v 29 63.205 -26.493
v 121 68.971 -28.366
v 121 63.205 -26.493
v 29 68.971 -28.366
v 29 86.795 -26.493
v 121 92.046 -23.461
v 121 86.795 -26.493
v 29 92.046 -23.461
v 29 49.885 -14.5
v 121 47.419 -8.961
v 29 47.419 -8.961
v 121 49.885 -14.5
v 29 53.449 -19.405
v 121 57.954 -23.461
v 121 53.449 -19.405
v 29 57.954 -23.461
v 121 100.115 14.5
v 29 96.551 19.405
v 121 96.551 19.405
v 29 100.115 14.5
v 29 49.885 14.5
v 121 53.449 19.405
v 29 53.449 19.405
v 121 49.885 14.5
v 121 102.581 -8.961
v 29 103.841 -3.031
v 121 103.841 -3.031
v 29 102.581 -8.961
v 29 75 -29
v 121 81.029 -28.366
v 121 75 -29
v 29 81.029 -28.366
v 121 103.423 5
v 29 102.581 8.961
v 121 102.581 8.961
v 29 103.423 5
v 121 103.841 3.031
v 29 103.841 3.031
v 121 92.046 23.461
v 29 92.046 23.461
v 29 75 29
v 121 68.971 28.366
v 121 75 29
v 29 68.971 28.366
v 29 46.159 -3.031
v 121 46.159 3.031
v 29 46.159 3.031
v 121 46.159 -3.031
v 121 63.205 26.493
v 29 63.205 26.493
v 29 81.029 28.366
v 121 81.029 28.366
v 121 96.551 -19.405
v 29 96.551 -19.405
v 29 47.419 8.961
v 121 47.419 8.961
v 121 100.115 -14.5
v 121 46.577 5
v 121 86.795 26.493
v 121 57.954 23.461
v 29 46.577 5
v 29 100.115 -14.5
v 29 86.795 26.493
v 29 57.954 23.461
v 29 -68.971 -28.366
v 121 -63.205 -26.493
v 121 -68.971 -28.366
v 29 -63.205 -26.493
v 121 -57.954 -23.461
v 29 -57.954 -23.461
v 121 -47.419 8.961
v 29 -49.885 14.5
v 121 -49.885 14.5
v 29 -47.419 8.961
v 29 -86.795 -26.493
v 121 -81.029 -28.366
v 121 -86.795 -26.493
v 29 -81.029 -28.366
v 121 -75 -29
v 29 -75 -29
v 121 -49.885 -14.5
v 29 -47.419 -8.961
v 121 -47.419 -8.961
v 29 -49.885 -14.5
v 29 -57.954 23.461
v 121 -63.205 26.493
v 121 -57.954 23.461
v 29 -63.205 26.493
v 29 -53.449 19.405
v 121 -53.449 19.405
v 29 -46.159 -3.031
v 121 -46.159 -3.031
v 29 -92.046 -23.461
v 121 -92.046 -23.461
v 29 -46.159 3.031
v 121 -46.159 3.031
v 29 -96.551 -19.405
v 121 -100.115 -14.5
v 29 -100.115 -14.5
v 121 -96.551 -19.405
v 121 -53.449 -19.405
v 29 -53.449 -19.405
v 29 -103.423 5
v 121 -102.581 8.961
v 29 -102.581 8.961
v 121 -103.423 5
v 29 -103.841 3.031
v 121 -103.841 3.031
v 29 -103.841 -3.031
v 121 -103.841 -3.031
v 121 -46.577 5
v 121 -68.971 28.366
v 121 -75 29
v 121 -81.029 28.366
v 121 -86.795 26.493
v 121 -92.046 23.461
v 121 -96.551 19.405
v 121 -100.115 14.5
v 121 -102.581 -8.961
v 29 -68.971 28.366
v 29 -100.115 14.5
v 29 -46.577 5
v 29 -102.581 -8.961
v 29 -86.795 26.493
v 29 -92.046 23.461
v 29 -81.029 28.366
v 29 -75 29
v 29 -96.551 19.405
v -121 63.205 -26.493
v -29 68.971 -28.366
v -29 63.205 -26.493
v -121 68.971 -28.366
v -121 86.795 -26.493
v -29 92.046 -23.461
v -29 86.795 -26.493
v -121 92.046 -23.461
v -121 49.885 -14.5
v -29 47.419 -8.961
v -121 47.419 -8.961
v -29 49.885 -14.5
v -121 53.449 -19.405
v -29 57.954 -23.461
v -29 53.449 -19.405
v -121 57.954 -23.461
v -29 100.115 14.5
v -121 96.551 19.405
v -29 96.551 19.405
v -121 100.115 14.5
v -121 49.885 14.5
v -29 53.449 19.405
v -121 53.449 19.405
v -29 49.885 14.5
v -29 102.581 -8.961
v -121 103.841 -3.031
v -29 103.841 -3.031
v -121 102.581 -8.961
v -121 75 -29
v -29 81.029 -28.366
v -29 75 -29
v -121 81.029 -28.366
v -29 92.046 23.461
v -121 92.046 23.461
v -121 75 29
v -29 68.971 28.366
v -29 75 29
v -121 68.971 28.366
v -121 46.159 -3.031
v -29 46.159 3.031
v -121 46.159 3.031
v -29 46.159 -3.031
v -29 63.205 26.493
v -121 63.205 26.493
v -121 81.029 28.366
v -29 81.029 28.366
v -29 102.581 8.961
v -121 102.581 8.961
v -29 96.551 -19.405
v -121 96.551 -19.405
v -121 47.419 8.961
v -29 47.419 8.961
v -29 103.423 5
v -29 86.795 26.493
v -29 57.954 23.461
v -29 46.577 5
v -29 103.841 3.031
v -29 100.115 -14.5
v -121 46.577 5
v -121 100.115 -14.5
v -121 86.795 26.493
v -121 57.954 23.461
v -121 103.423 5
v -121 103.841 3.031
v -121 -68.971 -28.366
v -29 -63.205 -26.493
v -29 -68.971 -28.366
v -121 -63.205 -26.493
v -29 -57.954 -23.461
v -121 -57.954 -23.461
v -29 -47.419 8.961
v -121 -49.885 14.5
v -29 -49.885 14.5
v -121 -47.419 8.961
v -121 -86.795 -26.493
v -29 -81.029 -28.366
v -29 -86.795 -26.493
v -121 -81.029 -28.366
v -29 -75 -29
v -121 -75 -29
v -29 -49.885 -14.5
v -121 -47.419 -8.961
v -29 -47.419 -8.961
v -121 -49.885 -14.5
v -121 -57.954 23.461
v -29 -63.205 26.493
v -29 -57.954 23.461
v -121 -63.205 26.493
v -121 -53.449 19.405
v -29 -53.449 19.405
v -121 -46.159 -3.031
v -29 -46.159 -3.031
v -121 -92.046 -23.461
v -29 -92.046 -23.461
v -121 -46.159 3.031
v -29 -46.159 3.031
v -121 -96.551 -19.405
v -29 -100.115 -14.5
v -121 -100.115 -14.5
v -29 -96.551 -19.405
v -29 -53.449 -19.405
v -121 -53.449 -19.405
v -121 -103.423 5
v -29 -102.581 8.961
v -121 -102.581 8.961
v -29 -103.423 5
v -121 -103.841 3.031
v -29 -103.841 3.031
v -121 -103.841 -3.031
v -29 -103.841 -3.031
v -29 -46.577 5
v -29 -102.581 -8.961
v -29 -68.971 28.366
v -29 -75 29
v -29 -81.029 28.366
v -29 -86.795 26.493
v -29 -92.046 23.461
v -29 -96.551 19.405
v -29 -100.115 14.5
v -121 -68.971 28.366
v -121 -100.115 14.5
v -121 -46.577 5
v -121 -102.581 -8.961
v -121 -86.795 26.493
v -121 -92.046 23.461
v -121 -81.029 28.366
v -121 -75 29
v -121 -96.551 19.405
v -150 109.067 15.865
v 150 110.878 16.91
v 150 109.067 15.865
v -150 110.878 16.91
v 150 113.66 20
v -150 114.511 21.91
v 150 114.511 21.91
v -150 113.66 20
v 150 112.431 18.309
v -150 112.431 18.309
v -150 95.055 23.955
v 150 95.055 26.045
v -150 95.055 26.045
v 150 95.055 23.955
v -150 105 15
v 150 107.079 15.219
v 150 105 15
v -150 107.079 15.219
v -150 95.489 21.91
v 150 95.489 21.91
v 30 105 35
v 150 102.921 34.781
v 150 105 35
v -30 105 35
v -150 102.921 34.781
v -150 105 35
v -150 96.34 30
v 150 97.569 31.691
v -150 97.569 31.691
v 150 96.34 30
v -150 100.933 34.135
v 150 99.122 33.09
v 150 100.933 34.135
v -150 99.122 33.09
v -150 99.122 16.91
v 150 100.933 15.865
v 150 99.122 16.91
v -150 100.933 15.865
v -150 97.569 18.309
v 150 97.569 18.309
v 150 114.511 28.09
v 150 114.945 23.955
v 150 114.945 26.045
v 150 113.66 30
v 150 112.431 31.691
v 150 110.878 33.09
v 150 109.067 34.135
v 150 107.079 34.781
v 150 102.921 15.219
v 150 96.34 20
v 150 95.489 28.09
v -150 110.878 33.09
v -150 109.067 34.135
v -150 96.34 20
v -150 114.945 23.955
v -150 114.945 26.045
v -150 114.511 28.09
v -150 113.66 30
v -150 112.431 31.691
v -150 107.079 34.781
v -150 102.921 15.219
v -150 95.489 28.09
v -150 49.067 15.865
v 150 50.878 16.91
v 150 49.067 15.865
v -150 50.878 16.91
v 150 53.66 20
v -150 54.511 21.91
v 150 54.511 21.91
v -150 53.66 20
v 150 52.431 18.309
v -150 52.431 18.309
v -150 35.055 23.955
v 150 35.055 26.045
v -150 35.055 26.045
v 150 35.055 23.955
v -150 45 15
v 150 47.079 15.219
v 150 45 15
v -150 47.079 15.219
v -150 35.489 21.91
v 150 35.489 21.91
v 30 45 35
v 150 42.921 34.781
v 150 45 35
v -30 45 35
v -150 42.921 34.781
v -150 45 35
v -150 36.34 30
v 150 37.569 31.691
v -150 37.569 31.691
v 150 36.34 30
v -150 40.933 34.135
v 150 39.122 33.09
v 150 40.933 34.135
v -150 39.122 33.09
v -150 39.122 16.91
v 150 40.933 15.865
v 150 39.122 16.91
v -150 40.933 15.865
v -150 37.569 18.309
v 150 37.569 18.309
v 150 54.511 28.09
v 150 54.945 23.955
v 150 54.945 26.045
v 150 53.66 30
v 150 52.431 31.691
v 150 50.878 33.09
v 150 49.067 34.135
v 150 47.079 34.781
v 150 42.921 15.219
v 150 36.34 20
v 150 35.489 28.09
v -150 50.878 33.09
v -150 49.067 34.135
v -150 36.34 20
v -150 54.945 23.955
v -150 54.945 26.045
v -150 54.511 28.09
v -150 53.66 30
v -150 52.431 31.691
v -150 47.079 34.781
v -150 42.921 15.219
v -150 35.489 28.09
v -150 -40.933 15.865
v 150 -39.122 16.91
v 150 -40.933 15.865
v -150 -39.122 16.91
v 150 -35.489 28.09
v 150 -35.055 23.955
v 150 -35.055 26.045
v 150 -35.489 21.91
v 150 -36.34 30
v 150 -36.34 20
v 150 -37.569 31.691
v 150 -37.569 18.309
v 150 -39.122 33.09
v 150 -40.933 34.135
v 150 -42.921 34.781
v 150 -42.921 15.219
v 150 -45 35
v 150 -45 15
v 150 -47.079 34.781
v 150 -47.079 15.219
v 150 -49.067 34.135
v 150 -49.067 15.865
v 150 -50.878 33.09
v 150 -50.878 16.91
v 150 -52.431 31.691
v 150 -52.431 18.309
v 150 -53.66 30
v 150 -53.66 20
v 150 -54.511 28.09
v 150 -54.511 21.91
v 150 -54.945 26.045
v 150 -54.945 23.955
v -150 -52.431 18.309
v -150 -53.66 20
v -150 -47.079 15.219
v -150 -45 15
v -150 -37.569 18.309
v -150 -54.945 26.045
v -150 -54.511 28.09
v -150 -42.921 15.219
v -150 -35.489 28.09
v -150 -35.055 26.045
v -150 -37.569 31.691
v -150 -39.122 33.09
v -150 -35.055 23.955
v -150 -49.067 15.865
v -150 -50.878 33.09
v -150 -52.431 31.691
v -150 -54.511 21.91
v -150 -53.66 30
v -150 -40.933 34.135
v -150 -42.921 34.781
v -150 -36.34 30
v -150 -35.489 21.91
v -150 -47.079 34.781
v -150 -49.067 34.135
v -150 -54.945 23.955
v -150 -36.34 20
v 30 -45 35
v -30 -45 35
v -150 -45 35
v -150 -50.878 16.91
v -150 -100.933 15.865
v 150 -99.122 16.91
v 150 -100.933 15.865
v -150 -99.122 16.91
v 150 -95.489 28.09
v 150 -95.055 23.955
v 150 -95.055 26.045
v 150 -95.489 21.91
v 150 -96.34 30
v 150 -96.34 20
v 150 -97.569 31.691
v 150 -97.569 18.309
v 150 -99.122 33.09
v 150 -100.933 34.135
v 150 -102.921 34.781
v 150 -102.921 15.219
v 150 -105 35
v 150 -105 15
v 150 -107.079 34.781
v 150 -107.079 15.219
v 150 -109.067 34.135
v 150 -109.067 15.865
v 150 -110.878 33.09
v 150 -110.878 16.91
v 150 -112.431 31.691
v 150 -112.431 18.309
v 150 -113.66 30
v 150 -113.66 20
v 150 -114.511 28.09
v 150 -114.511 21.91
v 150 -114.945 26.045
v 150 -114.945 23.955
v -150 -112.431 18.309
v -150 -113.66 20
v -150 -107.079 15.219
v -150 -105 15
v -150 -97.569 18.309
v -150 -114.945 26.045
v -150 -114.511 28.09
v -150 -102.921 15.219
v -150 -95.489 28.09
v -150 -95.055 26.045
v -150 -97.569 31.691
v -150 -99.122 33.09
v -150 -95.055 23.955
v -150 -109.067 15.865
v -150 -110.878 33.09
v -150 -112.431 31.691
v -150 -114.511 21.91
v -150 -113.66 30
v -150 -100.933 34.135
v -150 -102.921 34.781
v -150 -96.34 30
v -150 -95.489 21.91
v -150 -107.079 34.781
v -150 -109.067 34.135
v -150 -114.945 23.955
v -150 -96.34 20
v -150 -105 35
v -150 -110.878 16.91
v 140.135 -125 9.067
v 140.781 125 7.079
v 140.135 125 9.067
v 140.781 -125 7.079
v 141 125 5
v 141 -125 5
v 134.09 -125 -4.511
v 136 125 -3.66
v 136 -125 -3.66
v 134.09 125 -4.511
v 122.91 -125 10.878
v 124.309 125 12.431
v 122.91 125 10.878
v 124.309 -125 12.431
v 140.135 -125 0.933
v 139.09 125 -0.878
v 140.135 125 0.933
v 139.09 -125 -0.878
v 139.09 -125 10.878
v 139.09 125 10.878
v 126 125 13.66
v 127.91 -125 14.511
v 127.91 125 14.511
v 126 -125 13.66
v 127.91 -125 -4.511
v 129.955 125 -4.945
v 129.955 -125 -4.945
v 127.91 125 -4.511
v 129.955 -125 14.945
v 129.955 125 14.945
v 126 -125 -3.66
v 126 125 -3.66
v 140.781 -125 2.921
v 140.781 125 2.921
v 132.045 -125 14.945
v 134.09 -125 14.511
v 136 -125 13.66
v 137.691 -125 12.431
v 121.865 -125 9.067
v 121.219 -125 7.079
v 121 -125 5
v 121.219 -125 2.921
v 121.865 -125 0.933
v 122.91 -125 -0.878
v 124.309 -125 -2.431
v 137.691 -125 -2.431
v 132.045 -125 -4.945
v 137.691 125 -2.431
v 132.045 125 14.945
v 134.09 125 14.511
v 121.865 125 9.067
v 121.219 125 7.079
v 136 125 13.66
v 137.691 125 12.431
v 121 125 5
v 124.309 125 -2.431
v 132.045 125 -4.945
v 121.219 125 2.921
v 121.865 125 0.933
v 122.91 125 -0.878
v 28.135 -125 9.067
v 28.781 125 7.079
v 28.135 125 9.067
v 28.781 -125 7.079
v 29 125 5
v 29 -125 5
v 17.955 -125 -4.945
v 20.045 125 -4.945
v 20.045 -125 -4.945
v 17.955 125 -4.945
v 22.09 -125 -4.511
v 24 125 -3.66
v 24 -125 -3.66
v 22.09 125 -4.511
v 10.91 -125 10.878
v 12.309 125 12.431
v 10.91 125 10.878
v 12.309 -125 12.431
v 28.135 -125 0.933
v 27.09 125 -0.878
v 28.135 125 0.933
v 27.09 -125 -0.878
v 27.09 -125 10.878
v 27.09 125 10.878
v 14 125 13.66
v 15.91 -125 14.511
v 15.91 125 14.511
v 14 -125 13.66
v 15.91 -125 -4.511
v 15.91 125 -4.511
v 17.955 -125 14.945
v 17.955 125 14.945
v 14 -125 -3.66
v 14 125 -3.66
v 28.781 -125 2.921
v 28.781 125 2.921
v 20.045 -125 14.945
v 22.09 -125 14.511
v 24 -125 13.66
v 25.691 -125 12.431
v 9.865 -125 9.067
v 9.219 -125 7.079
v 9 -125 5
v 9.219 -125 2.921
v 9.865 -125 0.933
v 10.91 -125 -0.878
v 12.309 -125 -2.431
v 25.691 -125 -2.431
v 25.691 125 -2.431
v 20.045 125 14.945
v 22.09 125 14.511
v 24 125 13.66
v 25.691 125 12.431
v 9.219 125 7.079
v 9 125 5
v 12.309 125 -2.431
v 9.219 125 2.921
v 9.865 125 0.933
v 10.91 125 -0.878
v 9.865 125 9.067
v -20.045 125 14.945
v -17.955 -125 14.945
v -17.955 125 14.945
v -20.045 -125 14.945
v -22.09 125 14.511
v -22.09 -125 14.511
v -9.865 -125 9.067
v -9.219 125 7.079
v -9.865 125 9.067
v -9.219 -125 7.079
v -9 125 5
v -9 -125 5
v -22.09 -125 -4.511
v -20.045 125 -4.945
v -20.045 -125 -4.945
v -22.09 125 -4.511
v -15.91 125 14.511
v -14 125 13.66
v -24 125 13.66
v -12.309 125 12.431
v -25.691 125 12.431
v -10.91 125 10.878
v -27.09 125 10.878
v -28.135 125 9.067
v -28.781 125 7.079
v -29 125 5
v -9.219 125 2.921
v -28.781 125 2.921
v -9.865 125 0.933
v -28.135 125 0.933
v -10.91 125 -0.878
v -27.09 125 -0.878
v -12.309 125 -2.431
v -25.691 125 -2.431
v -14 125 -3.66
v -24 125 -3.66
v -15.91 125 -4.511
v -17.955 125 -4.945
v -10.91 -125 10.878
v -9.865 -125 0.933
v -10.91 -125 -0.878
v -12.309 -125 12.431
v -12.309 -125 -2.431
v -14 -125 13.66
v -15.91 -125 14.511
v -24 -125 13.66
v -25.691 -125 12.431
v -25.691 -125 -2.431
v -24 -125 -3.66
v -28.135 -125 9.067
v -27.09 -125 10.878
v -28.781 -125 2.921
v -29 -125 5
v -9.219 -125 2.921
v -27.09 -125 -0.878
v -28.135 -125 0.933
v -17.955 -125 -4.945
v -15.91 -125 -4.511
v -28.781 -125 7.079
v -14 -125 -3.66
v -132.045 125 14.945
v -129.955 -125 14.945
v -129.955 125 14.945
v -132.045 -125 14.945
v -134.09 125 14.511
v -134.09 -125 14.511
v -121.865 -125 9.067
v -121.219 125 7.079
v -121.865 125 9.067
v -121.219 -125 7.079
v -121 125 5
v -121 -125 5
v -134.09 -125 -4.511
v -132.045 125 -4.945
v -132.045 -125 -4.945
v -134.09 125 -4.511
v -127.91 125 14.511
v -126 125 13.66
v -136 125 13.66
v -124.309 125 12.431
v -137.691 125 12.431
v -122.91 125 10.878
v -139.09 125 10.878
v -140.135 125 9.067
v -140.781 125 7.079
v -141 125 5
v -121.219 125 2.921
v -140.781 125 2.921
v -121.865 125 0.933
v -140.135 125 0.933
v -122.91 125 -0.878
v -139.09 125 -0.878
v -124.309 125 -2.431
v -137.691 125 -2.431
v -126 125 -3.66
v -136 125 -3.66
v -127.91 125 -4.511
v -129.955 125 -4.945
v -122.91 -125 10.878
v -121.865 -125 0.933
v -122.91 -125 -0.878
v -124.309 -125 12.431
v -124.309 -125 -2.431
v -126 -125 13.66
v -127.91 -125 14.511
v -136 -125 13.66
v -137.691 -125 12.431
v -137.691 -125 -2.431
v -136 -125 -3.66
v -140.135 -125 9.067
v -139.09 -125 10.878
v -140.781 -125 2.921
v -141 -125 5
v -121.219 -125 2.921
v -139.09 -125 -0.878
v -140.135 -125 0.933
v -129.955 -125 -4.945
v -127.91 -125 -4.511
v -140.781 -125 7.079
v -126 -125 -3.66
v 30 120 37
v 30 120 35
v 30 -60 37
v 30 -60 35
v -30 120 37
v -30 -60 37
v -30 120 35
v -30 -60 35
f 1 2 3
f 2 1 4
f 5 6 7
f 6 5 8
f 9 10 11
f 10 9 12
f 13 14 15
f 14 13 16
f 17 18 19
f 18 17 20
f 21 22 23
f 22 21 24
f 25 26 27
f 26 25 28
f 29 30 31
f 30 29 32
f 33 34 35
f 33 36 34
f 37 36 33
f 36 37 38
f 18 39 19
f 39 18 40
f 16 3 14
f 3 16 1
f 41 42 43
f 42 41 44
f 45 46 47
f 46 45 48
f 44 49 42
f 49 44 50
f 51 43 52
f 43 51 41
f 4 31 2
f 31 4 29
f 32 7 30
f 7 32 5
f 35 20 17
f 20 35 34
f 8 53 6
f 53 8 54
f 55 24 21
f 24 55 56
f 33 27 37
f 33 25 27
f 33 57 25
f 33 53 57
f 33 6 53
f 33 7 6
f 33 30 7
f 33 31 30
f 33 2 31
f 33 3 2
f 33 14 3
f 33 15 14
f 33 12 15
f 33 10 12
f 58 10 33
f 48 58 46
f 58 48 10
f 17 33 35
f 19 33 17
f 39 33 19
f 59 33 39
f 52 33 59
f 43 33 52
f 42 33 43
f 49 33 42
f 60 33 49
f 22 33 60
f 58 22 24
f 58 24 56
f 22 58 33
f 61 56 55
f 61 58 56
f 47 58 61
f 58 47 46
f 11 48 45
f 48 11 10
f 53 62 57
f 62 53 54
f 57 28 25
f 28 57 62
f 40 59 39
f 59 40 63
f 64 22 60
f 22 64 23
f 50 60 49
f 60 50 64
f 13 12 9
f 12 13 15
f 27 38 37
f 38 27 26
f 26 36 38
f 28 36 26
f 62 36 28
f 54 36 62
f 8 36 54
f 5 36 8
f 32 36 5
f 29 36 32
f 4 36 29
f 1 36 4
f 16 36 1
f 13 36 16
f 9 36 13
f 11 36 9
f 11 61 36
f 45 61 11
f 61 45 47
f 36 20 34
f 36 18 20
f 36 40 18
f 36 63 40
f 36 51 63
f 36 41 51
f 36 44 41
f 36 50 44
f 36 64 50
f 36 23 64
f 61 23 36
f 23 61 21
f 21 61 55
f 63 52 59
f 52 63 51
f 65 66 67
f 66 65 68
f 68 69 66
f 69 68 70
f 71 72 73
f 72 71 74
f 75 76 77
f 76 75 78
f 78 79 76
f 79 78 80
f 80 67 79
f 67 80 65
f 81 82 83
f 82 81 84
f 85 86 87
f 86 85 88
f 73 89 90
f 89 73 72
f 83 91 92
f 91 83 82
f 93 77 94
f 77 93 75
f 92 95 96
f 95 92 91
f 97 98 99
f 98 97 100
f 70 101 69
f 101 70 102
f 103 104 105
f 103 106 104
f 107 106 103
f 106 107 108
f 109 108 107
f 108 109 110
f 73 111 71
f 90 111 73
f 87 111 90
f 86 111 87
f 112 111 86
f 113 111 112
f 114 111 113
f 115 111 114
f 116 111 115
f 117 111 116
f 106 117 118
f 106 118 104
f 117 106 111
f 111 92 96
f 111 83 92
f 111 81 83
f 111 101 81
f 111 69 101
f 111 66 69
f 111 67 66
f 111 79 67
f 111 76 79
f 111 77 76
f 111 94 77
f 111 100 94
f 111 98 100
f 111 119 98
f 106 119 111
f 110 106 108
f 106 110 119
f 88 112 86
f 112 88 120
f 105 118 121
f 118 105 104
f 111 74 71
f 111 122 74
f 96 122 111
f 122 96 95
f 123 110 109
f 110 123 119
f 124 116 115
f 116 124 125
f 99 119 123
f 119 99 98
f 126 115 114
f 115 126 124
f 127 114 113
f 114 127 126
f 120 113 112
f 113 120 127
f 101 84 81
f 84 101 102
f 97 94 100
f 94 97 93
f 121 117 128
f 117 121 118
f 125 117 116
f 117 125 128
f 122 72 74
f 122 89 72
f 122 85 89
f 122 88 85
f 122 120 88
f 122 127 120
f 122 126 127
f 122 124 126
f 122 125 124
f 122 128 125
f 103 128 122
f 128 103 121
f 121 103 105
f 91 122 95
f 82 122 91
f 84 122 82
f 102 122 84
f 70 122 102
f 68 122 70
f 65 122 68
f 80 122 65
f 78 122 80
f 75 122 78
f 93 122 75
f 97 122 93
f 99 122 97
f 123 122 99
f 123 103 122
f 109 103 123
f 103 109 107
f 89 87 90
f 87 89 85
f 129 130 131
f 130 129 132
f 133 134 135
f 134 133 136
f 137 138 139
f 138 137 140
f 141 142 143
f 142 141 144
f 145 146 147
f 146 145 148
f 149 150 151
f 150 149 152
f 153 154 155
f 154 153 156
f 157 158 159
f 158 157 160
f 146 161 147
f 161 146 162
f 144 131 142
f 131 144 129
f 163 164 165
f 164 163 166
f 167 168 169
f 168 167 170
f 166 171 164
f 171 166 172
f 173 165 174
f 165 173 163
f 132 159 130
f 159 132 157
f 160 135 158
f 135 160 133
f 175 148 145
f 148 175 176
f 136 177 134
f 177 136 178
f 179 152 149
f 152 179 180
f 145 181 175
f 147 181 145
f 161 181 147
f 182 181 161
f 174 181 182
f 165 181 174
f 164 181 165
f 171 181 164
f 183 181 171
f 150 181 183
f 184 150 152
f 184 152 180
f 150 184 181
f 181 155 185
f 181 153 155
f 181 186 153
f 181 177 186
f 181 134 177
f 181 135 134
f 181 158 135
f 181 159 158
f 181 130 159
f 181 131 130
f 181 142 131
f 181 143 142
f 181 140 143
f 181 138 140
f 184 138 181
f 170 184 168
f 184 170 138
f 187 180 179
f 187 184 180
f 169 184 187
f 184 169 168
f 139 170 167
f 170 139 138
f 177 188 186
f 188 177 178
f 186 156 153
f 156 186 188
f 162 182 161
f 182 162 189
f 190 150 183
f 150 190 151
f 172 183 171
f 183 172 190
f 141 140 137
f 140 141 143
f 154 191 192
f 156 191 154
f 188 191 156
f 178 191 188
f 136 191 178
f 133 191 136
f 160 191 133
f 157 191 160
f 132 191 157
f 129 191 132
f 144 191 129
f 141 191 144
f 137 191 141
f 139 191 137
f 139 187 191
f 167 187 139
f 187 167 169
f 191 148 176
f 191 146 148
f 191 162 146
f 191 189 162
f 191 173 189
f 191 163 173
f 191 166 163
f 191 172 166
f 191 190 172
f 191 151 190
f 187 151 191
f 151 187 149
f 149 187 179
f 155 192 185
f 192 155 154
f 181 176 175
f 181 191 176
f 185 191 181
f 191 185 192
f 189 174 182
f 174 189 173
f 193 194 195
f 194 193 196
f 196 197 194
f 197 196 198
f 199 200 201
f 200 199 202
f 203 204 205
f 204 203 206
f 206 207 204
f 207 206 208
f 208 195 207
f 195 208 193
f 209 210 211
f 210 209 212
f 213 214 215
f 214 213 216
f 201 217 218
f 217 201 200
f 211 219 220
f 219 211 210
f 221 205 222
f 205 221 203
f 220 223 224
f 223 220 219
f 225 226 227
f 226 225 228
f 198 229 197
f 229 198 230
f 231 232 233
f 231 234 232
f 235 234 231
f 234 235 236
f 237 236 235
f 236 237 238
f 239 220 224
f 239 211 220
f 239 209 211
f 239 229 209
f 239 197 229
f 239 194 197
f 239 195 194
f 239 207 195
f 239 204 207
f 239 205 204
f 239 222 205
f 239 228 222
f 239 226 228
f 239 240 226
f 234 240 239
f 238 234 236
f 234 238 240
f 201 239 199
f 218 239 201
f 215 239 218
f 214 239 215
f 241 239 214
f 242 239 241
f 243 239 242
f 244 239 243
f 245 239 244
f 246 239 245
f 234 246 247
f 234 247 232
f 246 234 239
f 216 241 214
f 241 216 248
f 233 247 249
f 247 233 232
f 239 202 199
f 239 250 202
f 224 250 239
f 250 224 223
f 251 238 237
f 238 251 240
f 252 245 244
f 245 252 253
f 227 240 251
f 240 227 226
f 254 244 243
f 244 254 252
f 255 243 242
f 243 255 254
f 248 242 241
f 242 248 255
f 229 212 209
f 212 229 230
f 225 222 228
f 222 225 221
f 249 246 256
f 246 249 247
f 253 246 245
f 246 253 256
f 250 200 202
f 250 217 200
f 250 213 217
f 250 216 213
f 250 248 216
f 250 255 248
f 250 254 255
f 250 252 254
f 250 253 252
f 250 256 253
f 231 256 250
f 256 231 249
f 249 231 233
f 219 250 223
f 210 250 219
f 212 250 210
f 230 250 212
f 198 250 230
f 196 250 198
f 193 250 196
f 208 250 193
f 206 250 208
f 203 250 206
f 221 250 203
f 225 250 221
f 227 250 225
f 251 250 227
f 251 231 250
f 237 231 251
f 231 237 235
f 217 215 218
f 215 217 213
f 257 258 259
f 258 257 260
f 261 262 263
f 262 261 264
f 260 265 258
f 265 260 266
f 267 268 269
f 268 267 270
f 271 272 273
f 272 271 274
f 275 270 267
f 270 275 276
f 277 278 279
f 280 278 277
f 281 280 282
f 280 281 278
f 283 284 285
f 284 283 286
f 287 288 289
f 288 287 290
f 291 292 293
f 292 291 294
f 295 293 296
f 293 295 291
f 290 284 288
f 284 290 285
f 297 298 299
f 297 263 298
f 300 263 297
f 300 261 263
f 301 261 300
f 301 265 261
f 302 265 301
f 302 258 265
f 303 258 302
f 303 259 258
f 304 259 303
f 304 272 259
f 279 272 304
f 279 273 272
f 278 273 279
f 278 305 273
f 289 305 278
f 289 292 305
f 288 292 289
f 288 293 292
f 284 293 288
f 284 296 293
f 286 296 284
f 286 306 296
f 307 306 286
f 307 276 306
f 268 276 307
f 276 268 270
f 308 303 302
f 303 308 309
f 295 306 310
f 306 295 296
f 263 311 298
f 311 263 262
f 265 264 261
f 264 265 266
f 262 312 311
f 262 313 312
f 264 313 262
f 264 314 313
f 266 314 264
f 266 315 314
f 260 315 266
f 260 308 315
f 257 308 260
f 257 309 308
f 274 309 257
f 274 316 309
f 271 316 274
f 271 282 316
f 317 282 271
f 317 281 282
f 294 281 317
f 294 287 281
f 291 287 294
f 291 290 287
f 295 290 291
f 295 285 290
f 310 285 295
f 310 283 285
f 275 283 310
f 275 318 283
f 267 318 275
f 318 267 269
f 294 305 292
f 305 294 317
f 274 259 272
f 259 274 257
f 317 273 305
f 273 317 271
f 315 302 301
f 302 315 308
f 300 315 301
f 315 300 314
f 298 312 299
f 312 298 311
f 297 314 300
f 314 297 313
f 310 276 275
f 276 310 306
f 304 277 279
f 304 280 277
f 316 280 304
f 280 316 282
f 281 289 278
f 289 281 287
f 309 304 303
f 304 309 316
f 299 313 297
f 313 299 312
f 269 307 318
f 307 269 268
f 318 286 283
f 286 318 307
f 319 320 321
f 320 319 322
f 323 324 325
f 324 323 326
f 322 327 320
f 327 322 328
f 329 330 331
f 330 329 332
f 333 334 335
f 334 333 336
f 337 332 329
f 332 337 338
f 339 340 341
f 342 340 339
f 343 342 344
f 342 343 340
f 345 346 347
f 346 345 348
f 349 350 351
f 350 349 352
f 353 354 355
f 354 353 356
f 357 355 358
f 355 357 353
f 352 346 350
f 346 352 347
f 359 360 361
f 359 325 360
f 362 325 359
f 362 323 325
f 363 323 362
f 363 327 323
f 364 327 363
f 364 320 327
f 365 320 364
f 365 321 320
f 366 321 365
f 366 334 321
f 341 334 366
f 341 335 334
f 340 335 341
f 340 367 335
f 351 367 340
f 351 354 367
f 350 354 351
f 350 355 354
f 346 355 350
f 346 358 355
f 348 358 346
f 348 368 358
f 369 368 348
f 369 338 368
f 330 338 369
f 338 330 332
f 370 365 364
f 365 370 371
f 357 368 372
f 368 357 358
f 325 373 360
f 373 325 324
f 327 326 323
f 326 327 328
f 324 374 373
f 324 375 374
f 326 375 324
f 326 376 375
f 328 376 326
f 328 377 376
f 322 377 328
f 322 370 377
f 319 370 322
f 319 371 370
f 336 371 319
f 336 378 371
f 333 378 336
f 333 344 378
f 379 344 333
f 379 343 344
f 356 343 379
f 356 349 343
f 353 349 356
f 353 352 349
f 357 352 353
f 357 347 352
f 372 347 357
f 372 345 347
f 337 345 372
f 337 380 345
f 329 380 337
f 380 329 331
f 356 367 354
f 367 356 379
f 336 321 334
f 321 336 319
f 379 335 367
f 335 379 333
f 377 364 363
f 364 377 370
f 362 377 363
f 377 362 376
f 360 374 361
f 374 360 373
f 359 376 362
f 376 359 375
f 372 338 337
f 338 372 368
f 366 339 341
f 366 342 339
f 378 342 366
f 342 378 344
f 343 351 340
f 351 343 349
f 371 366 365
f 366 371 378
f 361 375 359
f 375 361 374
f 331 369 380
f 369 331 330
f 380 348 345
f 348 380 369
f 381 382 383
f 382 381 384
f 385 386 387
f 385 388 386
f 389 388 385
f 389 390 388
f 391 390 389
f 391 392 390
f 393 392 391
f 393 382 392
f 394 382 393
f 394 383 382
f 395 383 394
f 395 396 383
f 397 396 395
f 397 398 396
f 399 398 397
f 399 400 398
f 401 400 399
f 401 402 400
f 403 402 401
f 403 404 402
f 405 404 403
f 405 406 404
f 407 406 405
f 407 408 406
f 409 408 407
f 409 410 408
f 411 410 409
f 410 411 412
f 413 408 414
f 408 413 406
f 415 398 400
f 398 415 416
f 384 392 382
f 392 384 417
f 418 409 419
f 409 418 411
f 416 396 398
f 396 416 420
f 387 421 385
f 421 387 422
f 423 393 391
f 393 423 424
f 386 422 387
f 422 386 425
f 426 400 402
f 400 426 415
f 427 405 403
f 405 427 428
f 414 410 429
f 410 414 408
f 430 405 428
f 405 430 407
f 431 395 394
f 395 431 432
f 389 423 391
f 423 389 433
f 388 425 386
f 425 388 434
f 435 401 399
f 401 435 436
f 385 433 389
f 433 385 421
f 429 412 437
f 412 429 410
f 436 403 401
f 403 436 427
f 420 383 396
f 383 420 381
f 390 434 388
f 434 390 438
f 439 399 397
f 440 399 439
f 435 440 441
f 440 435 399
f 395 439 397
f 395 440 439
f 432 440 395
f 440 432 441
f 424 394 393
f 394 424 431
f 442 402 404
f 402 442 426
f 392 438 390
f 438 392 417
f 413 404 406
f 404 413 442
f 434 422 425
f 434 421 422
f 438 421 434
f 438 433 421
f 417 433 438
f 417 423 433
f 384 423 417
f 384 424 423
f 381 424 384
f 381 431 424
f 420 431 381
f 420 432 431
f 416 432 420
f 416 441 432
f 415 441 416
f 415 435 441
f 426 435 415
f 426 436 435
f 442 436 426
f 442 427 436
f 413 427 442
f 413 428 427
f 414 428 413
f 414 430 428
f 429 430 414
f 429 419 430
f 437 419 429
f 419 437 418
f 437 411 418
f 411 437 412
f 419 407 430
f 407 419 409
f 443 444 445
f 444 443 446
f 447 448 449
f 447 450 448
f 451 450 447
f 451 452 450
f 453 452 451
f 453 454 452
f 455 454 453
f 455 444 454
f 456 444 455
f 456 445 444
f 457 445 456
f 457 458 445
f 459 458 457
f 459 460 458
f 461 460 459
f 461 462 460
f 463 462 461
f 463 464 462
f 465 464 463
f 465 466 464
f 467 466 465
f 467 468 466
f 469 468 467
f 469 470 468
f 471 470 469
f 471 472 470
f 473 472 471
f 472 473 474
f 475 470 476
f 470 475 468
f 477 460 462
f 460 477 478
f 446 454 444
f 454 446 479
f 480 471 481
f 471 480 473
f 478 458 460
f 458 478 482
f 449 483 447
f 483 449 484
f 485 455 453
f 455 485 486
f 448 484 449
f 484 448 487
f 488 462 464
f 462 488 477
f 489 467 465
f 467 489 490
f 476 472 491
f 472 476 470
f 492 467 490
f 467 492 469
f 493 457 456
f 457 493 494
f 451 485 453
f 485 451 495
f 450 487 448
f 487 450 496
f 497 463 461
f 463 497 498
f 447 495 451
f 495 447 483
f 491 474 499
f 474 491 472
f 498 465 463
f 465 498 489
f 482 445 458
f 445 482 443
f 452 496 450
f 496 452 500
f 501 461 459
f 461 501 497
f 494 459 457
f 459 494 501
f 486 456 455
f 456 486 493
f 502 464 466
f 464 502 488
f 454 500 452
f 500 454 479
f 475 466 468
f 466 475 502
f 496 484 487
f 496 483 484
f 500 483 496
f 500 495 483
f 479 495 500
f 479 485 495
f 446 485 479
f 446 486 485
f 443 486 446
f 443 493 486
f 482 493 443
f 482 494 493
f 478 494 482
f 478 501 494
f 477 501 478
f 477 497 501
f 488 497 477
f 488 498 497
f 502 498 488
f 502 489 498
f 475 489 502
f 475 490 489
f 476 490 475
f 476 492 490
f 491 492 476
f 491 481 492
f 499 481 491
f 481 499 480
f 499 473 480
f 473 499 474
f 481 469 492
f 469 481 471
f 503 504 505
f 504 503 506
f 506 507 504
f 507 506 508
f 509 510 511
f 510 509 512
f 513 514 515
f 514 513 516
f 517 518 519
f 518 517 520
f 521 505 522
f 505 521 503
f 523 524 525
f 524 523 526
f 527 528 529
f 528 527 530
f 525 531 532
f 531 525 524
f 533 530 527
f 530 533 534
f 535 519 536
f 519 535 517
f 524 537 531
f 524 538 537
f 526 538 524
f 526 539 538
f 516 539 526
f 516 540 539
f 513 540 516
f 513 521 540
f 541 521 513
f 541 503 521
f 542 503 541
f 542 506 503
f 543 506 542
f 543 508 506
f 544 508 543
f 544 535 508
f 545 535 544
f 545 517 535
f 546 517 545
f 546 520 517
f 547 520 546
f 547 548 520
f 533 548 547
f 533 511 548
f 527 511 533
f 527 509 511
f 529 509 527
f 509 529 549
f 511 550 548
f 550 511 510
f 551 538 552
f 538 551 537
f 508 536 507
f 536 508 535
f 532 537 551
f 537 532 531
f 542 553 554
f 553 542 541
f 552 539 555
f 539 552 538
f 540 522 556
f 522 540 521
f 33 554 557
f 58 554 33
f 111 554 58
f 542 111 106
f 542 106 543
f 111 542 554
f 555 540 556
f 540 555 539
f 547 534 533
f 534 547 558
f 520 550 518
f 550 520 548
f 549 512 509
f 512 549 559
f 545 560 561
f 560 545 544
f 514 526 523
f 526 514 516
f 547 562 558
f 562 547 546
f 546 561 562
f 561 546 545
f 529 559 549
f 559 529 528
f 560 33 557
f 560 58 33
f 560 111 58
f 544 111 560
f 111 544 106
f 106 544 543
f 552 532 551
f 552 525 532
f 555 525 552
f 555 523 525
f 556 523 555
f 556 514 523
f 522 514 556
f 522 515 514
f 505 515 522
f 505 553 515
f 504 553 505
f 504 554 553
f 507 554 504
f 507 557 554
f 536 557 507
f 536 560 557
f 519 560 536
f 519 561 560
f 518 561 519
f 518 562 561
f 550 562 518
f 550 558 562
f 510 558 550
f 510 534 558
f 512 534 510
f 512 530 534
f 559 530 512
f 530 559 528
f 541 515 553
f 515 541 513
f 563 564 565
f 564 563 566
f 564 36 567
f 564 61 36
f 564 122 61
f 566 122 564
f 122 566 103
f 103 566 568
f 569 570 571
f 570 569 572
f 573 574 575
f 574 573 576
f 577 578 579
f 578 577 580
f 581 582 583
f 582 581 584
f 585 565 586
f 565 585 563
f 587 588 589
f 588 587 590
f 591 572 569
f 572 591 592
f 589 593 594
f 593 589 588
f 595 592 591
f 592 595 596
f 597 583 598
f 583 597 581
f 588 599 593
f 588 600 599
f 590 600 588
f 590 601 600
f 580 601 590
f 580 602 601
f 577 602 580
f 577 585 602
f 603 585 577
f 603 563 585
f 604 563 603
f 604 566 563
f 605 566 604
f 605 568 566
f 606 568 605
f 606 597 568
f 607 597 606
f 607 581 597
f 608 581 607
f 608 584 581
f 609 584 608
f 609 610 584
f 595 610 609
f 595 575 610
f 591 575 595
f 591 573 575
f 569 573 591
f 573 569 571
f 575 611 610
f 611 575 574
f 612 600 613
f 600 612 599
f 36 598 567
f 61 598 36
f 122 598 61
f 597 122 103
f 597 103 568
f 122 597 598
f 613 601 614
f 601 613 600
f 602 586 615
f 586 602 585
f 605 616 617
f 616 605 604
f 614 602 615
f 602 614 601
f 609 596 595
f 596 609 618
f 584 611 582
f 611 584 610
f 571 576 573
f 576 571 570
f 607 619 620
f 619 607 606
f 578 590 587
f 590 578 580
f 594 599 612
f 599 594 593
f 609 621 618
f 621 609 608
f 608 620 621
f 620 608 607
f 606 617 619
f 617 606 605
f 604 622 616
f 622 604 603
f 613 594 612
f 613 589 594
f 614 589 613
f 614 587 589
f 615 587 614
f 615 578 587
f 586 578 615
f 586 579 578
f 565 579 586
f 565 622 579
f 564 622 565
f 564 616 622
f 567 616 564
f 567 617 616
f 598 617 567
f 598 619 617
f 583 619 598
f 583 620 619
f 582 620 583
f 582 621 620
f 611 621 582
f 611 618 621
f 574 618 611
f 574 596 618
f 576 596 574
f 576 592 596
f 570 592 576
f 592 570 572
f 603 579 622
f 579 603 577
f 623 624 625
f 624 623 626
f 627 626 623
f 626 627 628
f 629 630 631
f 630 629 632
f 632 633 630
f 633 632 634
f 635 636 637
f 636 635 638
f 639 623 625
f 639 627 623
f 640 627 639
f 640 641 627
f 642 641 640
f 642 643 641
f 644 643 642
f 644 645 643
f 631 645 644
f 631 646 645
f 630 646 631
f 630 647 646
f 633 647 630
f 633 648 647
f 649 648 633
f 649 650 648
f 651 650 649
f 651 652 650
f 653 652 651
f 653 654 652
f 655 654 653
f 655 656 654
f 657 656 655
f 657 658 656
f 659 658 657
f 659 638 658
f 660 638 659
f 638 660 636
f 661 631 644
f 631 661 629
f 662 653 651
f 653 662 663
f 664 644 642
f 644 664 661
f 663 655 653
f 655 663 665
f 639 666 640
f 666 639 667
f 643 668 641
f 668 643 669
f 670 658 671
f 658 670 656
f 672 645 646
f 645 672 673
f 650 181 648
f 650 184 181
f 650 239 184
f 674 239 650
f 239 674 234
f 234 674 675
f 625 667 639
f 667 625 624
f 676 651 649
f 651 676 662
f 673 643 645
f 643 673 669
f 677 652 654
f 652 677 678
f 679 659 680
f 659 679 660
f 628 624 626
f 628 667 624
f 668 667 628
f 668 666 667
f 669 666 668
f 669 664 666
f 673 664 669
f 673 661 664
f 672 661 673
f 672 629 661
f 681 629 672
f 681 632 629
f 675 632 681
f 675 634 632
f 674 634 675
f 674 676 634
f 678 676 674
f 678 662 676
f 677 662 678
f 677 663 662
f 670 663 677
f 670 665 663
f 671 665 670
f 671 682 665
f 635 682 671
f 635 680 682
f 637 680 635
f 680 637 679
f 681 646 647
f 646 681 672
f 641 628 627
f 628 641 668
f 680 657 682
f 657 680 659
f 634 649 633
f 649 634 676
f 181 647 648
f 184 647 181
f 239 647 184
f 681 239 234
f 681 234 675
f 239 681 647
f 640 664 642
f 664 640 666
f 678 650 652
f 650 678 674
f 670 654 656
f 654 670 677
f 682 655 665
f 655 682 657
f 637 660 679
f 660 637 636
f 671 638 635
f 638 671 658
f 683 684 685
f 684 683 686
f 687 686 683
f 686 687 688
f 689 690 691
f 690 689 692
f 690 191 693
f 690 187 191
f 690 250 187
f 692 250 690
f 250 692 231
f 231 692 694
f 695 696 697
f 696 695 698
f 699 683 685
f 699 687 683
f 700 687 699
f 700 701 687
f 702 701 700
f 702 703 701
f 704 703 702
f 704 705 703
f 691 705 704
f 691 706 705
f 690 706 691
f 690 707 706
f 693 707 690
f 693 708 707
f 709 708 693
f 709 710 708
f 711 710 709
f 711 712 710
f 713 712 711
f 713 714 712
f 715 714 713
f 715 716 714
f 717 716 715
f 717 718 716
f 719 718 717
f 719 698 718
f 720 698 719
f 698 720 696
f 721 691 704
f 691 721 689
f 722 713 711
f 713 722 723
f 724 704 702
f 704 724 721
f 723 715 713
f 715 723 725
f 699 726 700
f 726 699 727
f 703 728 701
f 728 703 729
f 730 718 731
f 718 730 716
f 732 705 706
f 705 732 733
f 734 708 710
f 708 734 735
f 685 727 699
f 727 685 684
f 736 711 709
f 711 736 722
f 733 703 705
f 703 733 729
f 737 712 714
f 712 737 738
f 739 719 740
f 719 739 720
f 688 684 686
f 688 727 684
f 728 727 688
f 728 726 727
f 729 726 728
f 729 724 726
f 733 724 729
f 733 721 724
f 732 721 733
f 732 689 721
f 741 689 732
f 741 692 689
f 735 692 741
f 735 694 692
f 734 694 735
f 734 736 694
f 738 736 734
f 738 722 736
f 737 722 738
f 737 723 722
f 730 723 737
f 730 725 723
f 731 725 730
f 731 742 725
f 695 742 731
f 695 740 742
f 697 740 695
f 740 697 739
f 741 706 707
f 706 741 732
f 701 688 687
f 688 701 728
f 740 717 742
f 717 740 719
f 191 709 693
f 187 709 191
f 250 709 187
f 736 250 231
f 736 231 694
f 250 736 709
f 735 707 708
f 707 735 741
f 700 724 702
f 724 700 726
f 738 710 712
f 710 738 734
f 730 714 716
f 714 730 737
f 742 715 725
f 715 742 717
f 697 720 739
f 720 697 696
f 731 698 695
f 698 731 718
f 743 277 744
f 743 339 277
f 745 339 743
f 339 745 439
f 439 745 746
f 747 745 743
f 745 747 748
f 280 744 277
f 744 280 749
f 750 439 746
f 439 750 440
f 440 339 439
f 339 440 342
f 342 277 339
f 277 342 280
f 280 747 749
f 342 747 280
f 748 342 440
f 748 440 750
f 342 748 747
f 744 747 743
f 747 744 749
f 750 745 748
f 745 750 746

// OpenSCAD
vat_x = 75;
vat_y = 75;


module paal_rood() {
    rotate([0,90,00])
    color("red") {
        cylinder(h=300, d=20, center=true);
    }
}

module paal_blauw() {
    rotate([90,0,00])
    color("blue") {
        cylinder(h=250, d=20, center=true);
    }
}


module vat_200l()  {
    rotate([0,90,00])
    color("DeepSkyBlue") {
        cylinder(h=92, d=58, center=true);
    }
}

module tafelblad() {
    color("Green") {
        cube([60,180,2], true);
    }
}

translate([vat_x,vat_y,0]) vat_200l();
translate([vat_x,-vat_y,0]) vat_200l();
translate([-vat_x,vat_y,0]) vat_200l();
translate([-vat_x,-vat_y,0]) vat_200l();

translate([0,vat_y + 30,25]) paal_rood();
translate([0,vat_y - 30,25]) paal_rood();
translate([0,-vat_y + 30,25]) paal_rood();
translate([0,-vat_y - 30,25]) paal_rood();

translate([vat_x+56,0,5]) paal_blauw();
translate([vat_x-56,0,5]) paal_blauw();
translate([-vat_x+56,0,5]) paal_blauw();
translate([-vat_x-56,0,5]) paal_blauw();
translate([0, 30, 36]) tafelblad();
